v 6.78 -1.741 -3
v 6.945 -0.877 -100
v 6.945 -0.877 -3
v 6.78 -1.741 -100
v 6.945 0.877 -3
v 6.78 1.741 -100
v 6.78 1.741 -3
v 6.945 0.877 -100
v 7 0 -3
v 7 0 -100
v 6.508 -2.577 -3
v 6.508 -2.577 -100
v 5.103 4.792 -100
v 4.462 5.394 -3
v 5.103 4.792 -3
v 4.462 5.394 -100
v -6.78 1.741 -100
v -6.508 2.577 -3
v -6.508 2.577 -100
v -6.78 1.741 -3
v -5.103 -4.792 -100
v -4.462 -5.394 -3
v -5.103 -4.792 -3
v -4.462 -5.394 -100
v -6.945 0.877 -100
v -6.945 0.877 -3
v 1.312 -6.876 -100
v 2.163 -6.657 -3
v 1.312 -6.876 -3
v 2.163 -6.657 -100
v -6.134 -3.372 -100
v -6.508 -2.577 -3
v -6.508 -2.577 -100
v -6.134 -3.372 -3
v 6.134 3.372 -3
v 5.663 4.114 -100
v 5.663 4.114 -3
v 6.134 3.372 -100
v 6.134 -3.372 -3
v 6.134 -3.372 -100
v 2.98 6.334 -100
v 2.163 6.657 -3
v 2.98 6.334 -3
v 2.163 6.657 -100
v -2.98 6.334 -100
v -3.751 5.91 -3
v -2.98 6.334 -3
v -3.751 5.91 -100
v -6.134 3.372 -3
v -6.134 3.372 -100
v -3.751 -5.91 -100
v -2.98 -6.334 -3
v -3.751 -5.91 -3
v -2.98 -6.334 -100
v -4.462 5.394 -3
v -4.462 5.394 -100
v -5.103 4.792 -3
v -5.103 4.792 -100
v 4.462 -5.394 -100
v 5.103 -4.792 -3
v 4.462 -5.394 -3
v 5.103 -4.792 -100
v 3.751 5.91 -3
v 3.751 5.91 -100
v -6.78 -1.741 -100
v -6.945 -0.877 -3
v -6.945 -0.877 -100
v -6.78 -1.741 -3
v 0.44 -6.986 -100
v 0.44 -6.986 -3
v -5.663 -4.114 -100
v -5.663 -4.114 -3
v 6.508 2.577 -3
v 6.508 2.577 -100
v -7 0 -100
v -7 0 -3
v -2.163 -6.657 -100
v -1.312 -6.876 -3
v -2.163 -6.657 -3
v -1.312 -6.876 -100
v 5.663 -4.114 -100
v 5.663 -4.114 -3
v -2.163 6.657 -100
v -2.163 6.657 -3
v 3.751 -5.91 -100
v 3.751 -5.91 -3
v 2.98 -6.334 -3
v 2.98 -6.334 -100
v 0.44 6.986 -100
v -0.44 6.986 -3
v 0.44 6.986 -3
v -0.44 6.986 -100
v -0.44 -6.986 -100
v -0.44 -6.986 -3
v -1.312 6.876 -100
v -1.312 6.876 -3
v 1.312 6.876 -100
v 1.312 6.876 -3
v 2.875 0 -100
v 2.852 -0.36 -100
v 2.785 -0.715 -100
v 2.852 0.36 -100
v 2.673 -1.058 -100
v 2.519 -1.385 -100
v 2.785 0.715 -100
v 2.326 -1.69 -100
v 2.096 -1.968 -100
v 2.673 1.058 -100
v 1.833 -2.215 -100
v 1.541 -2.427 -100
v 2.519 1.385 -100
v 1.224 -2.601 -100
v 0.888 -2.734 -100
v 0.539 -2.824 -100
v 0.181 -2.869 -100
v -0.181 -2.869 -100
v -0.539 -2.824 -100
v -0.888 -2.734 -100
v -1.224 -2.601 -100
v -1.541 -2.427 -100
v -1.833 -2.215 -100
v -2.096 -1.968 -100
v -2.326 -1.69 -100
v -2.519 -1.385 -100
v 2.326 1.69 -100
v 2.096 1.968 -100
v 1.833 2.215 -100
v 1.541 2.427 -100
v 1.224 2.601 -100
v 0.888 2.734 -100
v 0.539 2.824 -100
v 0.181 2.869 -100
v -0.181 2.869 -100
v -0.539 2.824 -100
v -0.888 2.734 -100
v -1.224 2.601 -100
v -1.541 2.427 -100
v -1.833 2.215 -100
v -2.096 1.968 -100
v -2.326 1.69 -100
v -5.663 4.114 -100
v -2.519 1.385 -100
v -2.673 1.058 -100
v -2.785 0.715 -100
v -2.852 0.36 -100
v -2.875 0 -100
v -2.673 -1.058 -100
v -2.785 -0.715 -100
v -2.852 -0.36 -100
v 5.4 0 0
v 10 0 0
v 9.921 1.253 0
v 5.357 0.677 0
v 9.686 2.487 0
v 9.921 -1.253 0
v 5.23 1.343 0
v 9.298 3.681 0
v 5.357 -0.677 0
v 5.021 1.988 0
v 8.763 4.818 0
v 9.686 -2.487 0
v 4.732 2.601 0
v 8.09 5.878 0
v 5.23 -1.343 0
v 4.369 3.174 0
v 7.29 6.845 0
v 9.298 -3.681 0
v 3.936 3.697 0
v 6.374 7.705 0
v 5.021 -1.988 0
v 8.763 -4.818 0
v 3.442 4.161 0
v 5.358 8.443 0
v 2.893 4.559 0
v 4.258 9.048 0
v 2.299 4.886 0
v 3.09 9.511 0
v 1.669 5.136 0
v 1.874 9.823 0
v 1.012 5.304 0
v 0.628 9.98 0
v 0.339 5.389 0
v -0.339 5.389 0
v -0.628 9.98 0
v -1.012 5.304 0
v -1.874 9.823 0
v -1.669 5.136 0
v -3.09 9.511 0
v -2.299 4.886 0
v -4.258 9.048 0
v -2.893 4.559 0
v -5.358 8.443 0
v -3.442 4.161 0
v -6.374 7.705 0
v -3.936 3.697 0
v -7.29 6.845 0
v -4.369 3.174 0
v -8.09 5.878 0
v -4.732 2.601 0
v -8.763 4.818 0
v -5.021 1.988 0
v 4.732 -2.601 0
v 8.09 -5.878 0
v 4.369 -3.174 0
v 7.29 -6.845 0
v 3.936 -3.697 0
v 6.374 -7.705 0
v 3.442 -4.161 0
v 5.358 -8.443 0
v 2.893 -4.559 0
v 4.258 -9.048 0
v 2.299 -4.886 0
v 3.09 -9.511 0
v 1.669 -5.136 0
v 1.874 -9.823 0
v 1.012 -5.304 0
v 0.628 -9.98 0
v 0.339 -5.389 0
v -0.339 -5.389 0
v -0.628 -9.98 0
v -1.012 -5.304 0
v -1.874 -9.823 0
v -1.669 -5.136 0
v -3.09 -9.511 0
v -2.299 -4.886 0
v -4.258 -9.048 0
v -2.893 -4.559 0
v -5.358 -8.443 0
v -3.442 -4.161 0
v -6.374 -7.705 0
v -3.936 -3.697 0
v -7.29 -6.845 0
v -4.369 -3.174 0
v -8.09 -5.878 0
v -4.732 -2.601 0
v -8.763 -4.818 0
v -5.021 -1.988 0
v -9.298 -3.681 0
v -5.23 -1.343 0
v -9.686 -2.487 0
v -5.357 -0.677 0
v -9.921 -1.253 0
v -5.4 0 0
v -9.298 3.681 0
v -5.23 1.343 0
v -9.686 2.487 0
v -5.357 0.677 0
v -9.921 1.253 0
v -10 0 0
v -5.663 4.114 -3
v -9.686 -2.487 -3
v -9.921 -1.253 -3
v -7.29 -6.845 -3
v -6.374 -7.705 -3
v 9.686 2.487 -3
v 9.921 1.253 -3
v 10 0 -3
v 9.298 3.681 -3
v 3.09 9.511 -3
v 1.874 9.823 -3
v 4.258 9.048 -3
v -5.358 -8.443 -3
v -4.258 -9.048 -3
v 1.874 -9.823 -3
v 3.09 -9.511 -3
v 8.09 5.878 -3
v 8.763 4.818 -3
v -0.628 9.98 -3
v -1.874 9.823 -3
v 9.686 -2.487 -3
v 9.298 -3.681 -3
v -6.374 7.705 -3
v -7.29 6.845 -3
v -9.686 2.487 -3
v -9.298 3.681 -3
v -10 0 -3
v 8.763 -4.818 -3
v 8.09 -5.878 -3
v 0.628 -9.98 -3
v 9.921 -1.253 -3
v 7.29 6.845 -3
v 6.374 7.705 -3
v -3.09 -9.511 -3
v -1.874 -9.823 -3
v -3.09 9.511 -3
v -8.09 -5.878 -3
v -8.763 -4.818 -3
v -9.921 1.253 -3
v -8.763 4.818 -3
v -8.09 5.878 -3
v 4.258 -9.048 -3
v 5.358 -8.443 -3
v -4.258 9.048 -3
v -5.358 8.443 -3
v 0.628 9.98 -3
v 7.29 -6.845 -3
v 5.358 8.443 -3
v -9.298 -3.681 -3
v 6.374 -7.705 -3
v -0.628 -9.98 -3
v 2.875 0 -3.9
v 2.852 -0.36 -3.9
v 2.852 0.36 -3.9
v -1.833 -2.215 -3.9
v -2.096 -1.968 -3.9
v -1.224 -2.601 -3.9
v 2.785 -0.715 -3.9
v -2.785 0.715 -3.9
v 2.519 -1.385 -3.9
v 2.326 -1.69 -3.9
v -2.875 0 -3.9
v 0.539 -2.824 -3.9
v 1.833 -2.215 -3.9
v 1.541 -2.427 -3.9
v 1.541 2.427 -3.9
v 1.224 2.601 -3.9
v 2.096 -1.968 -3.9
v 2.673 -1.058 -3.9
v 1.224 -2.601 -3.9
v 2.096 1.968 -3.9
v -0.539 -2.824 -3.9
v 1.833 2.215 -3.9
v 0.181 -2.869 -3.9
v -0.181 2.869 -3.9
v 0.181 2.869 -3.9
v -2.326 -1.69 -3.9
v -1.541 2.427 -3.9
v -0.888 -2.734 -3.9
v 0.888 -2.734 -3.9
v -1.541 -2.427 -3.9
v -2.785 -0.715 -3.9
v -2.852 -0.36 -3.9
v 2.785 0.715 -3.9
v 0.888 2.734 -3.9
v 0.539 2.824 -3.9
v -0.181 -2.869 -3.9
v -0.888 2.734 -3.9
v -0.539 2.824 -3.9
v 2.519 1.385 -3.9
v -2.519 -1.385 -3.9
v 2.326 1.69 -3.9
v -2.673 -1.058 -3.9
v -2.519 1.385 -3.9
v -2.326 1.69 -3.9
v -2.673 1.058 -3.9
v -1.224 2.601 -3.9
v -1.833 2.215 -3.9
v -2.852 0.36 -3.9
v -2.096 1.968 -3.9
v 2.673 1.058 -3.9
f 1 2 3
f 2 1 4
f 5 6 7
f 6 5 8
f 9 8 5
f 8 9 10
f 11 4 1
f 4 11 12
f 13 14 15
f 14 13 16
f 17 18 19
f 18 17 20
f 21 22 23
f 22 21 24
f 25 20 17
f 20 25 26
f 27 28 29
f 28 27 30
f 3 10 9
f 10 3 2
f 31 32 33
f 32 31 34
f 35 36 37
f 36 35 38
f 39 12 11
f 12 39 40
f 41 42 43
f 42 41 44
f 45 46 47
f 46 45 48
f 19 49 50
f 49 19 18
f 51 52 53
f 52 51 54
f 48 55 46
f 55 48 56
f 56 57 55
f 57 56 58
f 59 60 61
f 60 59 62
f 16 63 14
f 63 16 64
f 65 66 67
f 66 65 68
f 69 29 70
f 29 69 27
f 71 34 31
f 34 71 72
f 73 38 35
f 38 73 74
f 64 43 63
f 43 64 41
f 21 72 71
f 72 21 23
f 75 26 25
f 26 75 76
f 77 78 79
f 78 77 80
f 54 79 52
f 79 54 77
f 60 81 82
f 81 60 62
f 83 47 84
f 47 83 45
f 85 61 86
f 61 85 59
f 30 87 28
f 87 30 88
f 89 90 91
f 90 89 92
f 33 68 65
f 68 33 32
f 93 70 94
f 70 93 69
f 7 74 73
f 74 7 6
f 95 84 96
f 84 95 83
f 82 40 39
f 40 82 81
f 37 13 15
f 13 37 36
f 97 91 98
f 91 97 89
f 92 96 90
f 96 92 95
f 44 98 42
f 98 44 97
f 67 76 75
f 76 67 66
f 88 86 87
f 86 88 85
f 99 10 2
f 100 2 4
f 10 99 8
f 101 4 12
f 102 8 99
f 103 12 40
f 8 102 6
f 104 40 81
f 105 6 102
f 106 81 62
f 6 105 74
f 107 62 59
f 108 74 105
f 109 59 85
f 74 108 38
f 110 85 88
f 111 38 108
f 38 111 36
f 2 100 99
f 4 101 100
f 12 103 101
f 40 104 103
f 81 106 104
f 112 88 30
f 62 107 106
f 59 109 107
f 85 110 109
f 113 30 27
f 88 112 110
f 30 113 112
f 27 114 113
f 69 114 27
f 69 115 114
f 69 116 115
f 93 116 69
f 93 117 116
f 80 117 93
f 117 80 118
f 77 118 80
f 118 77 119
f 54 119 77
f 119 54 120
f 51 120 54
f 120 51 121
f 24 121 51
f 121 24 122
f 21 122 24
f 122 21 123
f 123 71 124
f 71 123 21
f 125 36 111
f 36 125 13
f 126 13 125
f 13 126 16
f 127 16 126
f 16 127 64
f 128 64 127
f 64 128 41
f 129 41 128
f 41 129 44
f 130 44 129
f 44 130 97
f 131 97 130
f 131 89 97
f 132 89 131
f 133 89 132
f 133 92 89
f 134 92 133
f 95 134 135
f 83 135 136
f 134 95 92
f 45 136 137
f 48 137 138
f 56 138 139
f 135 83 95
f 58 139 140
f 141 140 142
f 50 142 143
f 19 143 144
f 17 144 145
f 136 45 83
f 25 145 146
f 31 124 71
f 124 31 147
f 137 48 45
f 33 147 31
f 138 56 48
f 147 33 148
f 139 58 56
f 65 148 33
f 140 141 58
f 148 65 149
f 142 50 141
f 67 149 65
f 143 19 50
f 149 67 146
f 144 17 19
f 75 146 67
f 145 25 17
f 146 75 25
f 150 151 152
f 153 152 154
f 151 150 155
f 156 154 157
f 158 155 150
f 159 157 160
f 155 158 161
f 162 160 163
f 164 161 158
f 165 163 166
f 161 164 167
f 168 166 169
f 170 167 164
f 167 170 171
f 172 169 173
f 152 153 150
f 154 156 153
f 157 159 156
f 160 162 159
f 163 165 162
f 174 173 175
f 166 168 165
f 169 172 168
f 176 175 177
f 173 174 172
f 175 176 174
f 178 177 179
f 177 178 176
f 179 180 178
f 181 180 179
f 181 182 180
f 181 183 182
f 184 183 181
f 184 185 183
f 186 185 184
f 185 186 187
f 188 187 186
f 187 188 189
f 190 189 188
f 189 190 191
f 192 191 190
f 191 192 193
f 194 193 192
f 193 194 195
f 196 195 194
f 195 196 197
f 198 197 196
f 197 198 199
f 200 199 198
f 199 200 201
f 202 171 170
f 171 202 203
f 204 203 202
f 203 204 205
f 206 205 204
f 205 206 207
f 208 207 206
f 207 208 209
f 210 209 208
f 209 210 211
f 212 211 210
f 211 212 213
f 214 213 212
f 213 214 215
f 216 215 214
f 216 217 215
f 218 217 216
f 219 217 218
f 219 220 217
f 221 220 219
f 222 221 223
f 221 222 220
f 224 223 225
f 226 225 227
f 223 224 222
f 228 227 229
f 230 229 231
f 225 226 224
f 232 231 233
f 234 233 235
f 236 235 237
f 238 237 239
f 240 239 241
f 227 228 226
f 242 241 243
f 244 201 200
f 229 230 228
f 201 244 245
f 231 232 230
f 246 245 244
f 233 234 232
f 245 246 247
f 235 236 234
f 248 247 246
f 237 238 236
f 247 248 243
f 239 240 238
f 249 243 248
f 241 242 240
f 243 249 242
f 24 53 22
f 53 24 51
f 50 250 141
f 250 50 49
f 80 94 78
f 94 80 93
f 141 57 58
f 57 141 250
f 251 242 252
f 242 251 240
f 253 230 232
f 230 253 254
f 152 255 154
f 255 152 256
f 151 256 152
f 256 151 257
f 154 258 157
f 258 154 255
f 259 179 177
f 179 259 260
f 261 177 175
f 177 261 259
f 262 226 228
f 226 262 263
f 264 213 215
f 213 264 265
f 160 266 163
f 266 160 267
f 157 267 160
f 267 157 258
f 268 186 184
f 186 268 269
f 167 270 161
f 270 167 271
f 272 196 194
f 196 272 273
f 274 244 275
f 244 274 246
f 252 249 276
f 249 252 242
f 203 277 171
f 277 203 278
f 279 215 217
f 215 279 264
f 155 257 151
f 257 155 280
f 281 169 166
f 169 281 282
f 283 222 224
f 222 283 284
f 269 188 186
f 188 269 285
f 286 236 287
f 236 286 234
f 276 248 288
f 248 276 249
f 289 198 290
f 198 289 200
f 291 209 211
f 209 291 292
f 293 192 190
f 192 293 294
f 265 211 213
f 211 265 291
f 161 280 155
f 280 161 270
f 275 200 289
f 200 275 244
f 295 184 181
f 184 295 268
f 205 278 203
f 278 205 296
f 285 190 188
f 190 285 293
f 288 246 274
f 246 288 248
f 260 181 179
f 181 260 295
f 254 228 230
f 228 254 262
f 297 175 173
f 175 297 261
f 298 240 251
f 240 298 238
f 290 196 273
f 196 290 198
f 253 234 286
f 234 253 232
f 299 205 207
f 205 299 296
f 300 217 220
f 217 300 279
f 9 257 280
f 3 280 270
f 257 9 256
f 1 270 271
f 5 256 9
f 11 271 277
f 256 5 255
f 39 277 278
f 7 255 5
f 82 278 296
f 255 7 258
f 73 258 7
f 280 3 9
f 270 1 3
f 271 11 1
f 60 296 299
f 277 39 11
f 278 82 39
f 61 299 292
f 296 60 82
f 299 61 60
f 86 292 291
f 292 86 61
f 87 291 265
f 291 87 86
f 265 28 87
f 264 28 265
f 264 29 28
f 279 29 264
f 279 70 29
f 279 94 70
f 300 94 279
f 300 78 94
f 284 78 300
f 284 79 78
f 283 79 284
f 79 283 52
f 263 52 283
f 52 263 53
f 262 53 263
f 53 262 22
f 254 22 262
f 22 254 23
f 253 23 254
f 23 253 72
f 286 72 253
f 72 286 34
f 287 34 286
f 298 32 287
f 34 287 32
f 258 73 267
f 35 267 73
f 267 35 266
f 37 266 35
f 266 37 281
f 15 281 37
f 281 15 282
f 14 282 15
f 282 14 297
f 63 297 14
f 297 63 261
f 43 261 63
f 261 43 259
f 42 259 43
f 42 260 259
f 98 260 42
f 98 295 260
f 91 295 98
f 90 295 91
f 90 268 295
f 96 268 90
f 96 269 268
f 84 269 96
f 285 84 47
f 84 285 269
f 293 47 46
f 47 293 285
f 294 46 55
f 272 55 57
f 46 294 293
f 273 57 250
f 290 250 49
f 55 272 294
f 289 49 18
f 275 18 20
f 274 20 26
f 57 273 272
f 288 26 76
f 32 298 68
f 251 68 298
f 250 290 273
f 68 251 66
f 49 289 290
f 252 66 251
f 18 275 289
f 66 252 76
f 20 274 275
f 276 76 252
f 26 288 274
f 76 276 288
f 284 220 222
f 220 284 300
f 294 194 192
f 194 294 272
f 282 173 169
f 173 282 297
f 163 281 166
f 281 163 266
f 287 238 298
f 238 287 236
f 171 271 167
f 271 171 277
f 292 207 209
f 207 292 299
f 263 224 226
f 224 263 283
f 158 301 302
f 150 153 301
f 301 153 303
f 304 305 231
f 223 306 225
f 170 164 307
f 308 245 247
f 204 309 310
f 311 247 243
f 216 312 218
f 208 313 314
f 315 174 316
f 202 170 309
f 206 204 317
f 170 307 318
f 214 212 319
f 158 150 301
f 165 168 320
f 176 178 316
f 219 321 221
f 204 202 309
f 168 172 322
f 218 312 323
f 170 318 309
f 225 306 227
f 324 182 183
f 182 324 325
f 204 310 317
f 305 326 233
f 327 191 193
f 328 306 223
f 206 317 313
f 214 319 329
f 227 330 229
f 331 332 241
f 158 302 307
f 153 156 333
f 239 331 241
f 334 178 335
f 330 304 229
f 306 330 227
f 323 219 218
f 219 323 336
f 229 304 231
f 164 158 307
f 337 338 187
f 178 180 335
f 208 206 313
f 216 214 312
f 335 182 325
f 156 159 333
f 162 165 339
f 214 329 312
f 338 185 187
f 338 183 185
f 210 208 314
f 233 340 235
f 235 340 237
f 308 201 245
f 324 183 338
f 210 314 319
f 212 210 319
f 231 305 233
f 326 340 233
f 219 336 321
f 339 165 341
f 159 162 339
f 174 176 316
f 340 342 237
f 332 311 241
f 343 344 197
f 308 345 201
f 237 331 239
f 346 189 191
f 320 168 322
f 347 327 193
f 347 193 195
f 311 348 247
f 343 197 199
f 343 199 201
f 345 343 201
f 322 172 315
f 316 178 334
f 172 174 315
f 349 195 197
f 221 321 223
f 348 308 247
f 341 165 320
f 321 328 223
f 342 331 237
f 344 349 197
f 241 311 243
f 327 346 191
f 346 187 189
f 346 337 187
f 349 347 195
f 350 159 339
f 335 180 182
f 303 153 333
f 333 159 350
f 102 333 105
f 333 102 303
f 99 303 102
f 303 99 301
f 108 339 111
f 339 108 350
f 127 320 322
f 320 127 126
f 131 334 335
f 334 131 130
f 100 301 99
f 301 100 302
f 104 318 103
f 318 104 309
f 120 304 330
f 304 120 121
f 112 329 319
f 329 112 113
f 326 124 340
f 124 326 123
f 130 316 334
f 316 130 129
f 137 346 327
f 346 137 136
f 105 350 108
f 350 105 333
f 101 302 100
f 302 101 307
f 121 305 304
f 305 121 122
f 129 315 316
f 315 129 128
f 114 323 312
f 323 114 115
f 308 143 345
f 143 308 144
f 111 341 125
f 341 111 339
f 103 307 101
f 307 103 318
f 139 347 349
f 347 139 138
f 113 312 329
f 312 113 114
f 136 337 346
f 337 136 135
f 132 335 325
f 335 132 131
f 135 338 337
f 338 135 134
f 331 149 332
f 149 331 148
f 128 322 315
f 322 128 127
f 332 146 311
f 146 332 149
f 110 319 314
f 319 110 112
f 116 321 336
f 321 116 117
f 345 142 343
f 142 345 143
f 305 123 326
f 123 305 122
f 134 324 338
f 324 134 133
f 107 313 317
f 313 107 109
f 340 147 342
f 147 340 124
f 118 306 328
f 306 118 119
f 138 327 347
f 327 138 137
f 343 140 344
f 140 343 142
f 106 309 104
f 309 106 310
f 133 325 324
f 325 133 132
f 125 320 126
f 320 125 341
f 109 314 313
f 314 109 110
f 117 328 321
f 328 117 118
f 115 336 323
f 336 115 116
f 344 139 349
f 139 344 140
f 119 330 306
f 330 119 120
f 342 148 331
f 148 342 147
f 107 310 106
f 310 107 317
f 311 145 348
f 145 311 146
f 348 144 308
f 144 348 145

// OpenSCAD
$fn = 50;


difference() {
	union() {
		translate(v = [0, 0, -100.0000000000]) {
			cylinder(h = 100, r = 7.0000000000);
		}
		translate(v = [0, 0, -3.0000000000]) {
			cylinder(h = 3, r = 10.0000000000);
		}
	}
	union() {
		translate(v = [0, 0, 0]) {
			rotate(a = [0, 0, 0]) {
				difference() {
					union() {
						#translate(v = [0, 0, -100.0000000000]) {
							cylinder(h = 100, r = 2.6000000000);
						}
						#translate(v = [0, 0, -3.9000000000]) {
							cylinder(h = 3.9000000000, r = 7.0000000000, r1 = 2.8750000000, r2 = 5.4000000000);
						}
						#translate(v = [0, 0, -100.0000000000]) {
							cylinder(h = 100, r = 2.8750000000);
						}
						#translate(v = [0, 0, -100.0000000000]) {
							cylinder(h = 100, r = 2.6000000000);
						}
					}
					union();
				}
			}
		}
	}
}
